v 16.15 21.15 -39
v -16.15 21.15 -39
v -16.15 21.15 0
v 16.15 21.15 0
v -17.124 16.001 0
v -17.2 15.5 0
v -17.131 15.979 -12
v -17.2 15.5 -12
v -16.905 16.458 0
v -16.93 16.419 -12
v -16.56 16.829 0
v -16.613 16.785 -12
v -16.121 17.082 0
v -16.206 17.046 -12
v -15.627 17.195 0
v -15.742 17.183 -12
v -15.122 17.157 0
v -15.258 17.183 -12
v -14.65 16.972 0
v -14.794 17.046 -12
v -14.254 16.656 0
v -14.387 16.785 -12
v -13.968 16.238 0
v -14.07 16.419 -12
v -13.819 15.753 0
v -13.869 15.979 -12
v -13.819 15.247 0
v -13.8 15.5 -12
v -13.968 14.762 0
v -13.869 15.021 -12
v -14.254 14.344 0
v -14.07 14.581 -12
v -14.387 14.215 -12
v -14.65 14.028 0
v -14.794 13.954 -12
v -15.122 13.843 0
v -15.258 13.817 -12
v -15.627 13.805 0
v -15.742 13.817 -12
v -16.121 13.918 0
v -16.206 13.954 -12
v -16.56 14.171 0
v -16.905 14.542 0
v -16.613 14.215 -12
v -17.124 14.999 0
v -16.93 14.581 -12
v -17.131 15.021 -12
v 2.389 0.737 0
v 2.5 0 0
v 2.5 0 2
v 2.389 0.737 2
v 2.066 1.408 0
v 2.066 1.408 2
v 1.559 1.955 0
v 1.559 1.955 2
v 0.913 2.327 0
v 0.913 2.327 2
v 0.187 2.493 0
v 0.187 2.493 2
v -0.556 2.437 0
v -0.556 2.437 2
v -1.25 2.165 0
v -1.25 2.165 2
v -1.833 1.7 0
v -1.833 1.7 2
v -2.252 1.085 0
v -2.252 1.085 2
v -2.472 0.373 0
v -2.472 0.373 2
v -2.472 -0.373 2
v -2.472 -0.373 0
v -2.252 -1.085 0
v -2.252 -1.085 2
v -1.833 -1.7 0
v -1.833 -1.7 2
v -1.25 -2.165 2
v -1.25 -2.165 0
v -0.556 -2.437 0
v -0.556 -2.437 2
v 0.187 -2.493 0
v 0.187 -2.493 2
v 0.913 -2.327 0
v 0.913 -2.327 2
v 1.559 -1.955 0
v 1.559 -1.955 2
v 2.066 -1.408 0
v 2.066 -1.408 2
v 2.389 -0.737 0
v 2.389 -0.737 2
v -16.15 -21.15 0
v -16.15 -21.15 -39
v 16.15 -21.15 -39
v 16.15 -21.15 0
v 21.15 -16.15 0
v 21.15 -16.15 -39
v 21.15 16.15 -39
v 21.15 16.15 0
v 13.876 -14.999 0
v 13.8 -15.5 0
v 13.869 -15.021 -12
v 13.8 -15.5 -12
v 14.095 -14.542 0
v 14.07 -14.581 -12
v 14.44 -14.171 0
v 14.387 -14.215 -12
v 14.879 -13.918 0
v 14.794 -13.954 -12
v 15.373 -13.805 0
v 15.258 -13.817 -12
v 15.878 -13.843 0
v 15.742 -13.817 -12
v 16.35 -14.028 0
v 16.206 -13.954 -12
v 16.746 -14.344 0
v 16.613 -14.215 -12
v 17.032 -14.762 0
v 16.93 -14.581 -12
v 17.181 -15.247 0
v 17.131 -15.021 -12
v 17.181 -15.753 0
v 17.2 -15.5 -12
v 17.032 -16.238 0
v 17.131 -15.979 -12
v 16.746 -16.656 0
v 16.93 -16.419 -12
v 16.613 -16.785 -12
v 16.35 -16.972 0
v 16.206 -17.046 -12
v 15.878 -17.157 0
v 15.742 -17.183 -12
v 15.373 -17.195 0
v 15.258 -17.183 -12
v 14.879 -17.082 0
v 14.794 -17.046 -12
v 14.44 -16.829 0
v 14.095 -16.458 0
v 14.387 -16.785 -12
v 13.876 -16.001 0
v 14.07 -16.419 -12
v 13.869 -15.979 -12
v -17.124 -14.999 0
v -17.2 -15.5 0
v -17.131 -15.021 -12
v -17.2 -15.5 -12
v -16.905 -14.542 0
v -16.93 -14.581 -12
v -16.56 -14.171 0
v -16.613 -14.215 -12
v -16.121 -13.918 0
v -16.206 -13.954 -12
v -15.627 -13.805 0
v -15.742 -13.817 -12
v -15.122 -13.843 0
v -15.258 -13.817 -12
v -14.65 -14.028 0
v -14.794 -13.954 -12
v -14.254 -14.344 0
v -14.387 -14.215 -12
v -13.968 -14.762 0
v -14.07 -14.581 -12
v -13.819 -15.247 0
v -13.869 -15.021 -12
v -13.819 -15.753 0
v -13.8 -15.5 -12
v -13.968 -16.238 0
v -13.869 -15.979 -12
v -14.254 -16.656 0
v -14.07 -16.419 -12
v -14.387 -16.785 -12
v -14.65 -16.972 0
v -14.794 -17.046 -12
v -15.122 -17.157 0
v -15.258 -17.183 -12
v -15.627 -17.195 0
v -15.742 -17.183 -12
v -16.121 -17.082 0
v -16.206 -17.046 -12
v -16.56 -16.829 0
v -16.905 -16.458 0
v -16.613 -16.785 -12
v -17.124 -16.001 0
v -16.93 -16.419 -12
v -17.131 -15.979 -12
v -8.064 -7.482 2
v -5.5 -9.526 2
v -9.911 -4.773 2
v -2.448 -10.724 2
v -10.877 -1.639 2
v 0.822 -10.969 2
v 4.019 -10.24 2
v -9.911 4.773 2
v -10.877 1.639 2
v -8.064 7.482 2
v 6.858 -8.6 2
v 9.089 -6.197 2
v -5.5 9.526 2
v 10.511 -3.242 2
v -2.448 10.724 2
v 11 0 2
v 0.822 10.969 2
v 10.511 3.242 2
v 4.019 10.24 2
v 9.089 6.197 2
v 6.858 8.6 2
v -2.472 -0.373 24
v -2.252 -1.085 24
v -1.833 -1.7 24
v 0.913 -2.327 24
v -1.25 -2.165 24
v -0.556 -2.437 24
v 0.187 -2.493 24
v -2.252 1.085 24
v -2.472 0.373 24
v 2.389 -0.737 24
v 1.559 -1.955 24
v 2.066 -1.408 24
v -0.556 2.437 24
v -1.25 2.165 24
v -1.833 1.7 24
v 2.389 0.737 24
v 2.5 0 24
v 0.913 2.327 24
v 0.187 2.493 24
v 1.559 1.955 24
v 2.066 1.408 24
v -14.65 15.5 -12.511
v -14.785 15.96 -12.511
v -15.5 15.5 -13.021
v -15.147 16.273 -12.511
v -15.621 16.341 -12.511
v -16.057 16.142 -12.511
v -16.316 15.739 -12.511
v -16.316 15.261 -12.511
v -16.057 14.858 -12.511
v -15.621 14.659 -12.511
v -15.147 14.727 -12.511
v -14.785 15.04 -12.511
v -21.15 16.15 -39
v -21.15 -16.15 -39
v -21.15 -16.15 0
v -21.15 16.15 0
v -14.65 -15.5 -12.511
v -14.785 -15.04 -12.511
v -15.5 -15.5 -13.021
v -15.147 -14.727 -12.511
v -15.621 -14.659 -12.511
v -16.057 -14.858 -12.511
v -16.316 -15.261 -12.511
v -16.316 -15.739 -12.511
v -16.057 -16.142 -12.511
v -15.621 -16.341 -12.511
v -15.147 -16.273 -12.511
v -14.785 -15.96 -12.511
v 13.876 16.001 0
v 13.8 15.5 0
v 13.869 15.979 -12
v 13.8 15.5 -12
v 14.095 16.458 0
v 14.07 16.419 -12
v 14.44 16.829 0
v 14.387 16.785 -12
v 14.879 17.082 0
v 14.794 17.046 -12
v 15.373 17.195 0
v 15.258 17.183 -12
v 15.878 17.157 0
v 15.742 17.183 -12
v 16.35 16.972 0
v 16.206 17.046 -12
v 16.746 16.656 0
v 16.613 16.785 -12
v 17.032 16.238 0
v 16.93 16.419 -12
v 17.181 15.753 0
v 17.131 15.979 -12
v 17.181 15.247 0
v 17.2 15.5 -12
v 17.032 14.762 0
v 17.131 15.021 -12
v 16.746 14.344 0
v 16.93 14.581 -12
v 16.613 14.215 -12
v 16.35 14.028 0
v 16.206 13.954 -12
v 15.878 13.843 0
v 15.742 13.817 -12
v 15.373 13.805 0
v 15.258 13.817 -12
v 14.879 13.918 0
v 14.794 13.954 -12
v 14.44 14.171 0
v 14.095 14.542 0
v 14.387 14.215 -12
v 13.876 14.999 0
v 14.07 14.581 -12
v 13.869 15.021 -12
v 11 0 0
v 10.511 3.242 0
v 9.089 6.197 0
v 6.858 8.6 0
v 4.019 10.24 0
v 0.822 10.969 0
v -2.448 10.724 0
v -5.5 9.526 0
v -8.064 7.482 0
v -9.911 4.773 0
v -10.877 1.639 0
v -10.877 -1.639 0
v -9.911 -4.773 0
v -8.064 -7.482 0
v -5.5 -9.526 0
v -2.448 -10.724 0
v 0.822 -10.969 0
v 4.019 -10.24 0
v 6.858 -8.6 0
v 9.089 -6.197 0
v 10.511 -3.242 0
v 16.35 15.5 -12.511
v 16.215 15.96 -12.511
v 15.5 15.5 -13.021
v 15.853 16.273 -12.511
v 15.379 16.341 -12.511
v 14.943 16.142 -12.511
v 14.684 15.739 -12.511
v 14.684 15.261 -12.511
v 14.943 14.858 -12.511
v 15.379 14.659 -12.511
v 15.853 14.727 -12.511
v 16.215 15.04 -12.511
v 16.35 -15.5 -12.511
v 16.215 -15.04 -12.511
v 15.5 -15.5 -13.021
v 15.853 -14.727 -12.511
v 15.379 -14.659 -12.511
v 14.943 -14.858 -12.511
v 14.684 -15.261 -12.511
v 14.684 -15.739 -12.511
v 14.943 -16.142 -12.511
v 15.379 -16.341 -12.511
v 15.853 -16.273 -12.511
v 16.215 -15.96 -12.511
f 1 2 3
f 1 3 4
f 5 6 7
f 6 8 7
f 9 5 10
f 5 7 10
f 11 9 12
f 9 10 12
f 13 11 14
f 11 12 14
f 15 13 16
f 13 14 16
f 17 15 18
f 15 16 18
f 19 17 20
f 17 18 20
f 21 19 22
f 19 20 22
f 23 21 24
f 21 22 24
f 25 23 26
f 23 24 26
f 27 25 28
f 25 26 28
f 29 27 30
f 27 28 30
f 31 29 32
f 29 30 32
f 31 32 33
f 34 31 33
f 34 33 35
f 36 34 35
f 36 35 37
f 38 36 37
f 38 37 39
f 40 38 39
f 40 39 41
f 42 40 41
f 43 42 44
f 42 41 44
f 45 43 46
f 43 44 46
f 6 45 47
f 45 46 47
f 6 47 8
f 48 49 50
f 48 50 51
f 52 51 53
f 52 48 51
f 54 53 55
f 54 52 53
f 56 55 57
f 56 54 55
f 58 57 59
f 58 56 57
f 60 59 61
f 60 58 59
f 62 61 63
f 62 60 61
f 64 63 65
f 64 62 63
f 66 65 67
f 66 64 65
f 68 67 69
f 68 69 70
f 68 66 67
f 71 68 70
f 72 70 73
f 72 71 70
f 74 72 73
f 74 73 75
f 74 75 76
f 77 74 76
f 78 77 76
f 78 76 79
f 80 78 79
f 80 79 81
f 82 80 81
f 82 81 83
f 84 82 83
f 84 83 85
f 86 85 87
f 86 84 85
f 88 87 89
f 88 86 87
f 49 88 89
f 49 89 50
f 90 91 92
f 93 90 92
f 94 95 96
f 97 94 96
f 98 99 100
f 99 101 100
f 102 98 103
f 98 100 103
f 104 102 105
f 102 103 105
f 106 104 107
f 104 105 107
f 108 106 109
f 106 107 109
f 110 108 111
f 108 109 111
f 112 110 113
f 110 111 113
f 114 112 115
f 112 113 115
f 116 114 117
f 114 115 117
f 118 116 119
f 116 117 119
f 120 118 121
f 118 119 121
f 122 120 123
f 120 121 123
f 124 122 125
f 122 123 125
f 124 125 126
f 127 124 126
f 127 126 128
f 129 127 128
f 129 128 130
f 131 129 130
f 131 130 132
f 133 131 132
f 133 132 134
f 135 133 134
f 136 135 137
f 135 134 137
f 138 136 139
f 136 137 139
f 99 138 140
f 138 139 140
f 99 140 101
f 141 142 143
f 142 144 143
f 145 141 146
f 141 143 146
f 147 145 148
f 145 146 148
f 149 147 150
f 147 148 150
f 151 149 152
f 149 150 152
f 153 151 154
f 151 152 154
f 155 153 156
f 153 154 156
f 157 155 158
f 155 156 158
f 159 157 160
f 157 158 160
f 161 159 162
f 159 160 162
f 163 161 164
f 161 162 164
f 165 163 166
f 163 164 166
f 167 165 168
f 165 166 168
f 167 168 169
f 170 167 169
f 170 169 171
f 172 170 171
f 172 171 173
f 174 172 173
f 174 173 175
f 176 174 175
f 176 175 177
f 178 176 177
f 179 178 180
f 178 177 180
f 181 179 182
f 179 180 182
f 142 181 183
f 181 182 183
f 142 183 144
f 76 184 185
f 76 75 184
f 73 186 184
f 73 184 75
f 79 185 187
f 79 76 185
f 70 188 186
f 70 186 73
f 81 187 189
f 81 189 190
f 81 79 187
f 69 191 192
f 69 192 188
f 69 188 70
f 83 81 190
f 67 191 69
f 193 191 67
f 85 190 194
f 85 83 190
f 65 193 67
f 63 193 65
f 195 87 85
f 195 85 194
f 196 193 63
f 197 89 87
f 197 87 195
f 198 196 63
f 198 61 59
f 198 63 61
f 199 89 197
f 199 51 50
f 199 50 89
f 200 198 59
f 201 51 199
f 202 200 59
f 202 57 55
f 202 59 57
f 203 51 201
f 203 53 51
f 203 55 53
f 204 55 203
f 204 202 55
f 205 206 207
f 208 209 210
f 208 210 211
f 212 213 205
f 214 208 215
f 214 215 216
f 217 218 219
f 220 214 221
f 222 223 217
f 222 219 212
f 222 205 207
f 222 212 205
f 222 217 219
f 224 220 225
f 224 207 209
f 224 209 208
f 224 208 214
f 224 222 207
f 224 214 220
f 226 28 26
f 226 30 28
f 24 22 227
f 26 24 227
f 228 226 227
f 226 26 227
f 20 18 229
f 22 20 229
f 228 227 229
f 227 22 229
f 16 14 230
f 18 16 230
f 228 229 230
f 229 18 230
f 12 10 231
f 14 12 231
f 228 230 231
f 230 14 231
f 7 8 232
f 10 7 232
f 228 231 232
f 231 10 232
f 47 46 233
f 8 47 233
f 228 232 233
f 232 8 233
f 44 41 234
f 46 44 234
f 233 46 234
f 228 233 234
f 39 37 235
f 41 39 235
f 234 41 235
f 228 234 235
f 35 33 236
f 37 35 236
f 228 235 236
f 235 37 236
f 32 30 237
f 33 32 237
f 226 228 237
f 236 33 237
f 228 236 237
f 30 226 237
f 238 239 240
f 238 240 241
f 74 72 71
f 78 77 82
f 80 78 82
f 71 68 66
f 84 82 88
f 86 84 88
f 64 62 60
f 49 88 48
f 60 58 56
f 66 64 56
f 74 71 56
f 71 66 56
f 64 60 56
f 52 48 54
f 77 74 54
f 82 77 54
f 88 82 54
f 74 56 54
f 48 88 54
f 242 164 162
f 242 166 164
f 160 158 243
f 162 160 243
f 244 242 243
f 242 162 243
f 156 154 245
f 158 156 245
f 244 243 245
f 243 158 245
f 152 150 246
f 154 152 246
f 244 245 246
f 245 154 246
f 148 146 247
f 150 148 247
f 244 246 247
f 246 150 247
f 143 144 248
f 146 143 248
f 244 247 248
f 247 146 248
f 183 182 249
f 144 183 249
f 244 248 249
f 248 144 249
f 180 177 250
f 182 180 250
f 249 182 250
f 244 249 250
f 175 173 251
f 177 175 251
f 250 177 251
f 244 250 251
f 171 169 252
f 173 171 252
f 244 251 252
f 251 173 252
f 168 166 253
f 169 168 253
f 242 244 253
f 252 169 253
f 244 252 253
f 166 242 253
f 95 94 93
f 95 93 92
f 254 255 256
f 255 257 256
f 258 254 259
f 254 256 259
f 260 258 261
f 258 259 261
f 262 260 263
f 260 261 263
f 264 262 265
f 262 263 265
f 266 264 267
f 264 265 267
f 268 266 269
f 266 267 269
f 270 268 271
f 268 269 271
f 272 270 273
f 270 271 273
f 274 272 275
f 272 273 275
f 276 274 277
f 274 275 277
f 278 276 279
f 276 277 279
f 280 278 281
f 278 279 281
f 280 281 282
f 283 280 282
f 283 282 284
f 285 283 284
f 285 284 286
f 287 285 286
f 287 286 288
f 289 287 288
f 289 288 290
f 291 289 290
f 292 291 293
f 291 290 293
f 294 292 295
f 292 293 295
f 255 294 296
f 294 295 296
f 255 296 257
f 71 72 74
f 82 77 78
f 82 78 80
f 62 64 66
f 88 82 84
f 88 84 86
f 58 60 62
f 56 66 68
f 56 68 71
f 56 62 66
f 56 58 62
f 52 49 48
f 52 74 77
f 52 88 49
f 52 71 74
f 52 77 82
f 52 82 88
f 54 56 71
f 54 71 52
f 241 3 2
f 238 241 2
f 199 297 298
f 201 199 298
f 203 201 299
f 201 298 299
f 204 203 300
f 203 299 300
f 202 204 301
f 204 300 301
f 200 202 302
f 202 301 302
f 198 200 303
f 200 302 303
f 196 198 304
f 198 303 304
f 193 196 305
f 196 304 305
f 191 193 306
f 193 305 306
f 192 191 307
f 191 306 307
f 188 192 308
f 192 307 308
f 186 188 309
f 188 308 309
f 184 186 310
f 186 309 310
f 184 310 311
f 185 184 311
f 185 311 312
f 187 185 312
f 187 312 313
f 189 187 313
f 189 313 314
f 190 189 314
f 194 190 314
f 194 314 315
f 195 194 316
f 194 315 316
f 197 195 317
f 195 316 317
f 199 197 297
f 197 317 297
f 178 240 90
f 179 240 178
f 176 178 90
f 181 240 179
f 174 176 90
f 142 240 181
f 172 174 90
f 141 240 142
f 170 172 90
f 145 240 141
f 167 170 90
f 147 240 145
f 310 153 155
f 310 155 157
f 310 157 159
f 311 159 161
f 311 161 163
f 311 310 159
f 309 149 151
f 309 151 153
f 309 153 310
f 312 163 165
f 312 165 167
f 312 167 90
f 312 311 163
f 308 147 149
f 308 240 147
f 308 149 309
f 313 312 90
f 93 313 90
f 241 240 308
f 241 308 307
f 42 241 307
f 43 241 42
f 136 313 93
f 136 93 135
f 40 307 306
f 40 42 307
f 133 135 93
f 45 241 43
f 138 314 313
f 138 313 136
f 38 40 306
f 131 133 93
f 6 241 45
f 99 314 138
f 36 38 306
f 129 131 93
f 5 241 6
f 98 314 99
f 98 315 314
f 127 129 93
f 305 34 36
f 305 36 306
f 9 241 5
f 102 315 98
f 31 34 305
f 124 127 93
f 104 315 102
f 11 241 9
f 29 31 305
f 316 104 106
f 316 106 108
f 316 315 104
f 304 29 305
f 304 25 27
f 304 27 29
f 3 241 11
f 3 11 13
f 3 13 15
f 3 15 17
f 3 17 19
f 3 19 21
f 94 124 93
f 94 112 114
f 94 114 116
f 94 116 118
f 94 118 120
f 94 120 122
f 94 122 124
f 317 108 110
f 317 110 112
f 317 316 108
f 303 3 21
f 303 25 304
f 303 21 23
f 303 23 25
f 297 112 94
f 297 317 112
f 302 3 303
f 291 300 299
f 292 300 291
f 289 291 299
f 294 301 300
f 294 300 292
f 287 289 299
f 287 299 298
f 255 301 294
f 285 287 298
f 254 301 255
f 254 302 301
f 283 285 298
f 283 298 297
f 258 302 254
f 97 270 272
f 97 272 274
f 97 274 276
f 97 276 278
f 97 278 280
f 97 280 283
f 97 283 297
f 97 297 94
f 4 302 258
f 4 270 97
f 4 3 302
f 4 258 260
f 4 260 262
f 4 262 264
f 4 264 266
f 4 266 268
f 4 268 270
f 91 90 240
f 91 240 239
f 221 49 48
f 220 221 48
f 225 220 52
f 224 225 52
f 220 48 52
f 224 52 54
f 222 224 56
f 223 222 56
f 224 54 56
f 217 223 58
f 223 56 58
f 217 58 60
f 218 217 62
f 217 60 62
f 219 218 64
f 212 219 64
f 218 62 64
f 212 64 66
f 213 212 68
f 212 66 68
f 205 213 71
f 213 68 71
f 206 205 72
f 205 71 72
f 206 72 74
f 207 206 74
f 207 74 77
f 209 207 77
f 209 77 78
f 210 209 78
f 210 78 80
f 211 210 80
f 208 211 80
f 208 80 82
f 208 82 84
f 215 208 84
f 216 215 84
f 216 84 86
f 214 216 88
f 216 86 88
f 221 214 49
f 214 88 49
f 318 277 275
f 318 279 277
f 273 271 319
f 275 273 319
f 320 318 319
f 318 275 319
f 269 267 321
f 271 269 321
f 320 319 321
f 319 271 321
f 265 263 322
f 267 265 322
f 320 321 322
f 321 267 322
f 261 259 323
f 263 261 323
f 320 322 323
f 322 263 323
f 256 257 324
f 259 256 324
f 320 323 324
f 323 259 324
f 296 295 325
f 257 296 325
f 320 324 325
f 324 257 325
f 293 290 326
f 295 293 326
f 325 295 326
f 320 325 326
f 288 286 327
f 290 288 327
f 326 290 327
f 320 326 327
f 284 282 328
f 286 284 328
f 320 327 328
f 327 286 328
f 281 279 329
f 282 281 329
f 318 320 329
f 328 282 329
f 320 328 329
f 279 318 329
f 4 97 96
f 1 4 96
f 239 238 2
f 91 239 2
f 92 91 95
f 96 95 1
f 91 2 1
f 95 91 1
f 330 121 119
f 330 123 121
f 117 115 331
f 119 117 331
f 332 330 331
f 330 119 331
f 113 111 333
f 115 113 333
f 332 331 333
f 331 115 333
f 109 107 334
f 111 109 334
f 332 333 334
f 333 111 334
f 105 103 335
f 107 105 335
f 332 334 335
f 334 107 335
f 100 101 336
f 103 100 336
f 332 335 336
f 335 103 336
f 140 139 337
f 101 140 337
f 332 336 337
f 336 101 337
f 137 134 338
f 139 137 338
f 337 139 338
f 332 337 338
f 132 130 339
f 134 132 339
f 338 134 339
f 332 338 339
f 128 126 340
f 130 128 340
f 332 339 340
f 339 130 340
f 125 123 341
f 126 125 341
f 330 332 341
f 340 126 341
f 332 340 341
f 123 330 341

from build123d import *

# Parameters (mm, degrees)
F0_W     = 42.3
F0_H     = 42.3
F1_DEPTH = 39
F2_R     = 2.5
F3_DEPTH = 24
F2_R_2   = 11
F4_DEPTH = 2
F5_D     = 3.4
F5_DEPTH = 12
F5_TIP   = 1.0214630523
F6_SIZE  = 5


with BuildPart() as f1:
    # F0 (on Top) → F1 (new body)
    with BuildSketch(Plane.XY):
        Rectangle(F0_W, F0_H)
    extrude(amount=-F1_DEPTH)

    # F2 (on face) → F4 (join)
    with BuildSketch(Plane.XY):
        Circle(F2_R_2)
        Circle(F2_R, mode=Mode.SUBTRACT)
    extrude(amount=F4_DEPTH)

    # F5
    with Locations(Plane.XY):
        with Locations((15.5, -15.5), (15.5, 15.5), (-15.5, -15.5), (-15.5, 15.5)):
            Hole(F5_D / 2, depth=F5_DEPTH)
            with Locations((0, 0, -(F5_DEPTH + F5_TIP / 2))):  # 118° drill point
                Cone(0, F5_D / 2, F5_TIP, mode=Mode.SUBTRACT)

    # F6
    f6_edges = [f1.edges().sort_by_distance(p)[0] for p in [
        (-21.15, -21.15, -19.5),
        (21.15, 21.15, -19.5),
        (21.15, -21.15, -19.5),
        (-21.15, 21.15, -19.5),
    ]]
    chamfer(f6_edges, length=F6_SIZE)


with BuildPart() as f3:
    # F2 (on face) → F3 (new body)
    with BuildSketch(Plane.XY):
        Circle(F2_R)
    extrude(amount=F3_DEPTH)


solid = Compound([f1.part, f3.part])
